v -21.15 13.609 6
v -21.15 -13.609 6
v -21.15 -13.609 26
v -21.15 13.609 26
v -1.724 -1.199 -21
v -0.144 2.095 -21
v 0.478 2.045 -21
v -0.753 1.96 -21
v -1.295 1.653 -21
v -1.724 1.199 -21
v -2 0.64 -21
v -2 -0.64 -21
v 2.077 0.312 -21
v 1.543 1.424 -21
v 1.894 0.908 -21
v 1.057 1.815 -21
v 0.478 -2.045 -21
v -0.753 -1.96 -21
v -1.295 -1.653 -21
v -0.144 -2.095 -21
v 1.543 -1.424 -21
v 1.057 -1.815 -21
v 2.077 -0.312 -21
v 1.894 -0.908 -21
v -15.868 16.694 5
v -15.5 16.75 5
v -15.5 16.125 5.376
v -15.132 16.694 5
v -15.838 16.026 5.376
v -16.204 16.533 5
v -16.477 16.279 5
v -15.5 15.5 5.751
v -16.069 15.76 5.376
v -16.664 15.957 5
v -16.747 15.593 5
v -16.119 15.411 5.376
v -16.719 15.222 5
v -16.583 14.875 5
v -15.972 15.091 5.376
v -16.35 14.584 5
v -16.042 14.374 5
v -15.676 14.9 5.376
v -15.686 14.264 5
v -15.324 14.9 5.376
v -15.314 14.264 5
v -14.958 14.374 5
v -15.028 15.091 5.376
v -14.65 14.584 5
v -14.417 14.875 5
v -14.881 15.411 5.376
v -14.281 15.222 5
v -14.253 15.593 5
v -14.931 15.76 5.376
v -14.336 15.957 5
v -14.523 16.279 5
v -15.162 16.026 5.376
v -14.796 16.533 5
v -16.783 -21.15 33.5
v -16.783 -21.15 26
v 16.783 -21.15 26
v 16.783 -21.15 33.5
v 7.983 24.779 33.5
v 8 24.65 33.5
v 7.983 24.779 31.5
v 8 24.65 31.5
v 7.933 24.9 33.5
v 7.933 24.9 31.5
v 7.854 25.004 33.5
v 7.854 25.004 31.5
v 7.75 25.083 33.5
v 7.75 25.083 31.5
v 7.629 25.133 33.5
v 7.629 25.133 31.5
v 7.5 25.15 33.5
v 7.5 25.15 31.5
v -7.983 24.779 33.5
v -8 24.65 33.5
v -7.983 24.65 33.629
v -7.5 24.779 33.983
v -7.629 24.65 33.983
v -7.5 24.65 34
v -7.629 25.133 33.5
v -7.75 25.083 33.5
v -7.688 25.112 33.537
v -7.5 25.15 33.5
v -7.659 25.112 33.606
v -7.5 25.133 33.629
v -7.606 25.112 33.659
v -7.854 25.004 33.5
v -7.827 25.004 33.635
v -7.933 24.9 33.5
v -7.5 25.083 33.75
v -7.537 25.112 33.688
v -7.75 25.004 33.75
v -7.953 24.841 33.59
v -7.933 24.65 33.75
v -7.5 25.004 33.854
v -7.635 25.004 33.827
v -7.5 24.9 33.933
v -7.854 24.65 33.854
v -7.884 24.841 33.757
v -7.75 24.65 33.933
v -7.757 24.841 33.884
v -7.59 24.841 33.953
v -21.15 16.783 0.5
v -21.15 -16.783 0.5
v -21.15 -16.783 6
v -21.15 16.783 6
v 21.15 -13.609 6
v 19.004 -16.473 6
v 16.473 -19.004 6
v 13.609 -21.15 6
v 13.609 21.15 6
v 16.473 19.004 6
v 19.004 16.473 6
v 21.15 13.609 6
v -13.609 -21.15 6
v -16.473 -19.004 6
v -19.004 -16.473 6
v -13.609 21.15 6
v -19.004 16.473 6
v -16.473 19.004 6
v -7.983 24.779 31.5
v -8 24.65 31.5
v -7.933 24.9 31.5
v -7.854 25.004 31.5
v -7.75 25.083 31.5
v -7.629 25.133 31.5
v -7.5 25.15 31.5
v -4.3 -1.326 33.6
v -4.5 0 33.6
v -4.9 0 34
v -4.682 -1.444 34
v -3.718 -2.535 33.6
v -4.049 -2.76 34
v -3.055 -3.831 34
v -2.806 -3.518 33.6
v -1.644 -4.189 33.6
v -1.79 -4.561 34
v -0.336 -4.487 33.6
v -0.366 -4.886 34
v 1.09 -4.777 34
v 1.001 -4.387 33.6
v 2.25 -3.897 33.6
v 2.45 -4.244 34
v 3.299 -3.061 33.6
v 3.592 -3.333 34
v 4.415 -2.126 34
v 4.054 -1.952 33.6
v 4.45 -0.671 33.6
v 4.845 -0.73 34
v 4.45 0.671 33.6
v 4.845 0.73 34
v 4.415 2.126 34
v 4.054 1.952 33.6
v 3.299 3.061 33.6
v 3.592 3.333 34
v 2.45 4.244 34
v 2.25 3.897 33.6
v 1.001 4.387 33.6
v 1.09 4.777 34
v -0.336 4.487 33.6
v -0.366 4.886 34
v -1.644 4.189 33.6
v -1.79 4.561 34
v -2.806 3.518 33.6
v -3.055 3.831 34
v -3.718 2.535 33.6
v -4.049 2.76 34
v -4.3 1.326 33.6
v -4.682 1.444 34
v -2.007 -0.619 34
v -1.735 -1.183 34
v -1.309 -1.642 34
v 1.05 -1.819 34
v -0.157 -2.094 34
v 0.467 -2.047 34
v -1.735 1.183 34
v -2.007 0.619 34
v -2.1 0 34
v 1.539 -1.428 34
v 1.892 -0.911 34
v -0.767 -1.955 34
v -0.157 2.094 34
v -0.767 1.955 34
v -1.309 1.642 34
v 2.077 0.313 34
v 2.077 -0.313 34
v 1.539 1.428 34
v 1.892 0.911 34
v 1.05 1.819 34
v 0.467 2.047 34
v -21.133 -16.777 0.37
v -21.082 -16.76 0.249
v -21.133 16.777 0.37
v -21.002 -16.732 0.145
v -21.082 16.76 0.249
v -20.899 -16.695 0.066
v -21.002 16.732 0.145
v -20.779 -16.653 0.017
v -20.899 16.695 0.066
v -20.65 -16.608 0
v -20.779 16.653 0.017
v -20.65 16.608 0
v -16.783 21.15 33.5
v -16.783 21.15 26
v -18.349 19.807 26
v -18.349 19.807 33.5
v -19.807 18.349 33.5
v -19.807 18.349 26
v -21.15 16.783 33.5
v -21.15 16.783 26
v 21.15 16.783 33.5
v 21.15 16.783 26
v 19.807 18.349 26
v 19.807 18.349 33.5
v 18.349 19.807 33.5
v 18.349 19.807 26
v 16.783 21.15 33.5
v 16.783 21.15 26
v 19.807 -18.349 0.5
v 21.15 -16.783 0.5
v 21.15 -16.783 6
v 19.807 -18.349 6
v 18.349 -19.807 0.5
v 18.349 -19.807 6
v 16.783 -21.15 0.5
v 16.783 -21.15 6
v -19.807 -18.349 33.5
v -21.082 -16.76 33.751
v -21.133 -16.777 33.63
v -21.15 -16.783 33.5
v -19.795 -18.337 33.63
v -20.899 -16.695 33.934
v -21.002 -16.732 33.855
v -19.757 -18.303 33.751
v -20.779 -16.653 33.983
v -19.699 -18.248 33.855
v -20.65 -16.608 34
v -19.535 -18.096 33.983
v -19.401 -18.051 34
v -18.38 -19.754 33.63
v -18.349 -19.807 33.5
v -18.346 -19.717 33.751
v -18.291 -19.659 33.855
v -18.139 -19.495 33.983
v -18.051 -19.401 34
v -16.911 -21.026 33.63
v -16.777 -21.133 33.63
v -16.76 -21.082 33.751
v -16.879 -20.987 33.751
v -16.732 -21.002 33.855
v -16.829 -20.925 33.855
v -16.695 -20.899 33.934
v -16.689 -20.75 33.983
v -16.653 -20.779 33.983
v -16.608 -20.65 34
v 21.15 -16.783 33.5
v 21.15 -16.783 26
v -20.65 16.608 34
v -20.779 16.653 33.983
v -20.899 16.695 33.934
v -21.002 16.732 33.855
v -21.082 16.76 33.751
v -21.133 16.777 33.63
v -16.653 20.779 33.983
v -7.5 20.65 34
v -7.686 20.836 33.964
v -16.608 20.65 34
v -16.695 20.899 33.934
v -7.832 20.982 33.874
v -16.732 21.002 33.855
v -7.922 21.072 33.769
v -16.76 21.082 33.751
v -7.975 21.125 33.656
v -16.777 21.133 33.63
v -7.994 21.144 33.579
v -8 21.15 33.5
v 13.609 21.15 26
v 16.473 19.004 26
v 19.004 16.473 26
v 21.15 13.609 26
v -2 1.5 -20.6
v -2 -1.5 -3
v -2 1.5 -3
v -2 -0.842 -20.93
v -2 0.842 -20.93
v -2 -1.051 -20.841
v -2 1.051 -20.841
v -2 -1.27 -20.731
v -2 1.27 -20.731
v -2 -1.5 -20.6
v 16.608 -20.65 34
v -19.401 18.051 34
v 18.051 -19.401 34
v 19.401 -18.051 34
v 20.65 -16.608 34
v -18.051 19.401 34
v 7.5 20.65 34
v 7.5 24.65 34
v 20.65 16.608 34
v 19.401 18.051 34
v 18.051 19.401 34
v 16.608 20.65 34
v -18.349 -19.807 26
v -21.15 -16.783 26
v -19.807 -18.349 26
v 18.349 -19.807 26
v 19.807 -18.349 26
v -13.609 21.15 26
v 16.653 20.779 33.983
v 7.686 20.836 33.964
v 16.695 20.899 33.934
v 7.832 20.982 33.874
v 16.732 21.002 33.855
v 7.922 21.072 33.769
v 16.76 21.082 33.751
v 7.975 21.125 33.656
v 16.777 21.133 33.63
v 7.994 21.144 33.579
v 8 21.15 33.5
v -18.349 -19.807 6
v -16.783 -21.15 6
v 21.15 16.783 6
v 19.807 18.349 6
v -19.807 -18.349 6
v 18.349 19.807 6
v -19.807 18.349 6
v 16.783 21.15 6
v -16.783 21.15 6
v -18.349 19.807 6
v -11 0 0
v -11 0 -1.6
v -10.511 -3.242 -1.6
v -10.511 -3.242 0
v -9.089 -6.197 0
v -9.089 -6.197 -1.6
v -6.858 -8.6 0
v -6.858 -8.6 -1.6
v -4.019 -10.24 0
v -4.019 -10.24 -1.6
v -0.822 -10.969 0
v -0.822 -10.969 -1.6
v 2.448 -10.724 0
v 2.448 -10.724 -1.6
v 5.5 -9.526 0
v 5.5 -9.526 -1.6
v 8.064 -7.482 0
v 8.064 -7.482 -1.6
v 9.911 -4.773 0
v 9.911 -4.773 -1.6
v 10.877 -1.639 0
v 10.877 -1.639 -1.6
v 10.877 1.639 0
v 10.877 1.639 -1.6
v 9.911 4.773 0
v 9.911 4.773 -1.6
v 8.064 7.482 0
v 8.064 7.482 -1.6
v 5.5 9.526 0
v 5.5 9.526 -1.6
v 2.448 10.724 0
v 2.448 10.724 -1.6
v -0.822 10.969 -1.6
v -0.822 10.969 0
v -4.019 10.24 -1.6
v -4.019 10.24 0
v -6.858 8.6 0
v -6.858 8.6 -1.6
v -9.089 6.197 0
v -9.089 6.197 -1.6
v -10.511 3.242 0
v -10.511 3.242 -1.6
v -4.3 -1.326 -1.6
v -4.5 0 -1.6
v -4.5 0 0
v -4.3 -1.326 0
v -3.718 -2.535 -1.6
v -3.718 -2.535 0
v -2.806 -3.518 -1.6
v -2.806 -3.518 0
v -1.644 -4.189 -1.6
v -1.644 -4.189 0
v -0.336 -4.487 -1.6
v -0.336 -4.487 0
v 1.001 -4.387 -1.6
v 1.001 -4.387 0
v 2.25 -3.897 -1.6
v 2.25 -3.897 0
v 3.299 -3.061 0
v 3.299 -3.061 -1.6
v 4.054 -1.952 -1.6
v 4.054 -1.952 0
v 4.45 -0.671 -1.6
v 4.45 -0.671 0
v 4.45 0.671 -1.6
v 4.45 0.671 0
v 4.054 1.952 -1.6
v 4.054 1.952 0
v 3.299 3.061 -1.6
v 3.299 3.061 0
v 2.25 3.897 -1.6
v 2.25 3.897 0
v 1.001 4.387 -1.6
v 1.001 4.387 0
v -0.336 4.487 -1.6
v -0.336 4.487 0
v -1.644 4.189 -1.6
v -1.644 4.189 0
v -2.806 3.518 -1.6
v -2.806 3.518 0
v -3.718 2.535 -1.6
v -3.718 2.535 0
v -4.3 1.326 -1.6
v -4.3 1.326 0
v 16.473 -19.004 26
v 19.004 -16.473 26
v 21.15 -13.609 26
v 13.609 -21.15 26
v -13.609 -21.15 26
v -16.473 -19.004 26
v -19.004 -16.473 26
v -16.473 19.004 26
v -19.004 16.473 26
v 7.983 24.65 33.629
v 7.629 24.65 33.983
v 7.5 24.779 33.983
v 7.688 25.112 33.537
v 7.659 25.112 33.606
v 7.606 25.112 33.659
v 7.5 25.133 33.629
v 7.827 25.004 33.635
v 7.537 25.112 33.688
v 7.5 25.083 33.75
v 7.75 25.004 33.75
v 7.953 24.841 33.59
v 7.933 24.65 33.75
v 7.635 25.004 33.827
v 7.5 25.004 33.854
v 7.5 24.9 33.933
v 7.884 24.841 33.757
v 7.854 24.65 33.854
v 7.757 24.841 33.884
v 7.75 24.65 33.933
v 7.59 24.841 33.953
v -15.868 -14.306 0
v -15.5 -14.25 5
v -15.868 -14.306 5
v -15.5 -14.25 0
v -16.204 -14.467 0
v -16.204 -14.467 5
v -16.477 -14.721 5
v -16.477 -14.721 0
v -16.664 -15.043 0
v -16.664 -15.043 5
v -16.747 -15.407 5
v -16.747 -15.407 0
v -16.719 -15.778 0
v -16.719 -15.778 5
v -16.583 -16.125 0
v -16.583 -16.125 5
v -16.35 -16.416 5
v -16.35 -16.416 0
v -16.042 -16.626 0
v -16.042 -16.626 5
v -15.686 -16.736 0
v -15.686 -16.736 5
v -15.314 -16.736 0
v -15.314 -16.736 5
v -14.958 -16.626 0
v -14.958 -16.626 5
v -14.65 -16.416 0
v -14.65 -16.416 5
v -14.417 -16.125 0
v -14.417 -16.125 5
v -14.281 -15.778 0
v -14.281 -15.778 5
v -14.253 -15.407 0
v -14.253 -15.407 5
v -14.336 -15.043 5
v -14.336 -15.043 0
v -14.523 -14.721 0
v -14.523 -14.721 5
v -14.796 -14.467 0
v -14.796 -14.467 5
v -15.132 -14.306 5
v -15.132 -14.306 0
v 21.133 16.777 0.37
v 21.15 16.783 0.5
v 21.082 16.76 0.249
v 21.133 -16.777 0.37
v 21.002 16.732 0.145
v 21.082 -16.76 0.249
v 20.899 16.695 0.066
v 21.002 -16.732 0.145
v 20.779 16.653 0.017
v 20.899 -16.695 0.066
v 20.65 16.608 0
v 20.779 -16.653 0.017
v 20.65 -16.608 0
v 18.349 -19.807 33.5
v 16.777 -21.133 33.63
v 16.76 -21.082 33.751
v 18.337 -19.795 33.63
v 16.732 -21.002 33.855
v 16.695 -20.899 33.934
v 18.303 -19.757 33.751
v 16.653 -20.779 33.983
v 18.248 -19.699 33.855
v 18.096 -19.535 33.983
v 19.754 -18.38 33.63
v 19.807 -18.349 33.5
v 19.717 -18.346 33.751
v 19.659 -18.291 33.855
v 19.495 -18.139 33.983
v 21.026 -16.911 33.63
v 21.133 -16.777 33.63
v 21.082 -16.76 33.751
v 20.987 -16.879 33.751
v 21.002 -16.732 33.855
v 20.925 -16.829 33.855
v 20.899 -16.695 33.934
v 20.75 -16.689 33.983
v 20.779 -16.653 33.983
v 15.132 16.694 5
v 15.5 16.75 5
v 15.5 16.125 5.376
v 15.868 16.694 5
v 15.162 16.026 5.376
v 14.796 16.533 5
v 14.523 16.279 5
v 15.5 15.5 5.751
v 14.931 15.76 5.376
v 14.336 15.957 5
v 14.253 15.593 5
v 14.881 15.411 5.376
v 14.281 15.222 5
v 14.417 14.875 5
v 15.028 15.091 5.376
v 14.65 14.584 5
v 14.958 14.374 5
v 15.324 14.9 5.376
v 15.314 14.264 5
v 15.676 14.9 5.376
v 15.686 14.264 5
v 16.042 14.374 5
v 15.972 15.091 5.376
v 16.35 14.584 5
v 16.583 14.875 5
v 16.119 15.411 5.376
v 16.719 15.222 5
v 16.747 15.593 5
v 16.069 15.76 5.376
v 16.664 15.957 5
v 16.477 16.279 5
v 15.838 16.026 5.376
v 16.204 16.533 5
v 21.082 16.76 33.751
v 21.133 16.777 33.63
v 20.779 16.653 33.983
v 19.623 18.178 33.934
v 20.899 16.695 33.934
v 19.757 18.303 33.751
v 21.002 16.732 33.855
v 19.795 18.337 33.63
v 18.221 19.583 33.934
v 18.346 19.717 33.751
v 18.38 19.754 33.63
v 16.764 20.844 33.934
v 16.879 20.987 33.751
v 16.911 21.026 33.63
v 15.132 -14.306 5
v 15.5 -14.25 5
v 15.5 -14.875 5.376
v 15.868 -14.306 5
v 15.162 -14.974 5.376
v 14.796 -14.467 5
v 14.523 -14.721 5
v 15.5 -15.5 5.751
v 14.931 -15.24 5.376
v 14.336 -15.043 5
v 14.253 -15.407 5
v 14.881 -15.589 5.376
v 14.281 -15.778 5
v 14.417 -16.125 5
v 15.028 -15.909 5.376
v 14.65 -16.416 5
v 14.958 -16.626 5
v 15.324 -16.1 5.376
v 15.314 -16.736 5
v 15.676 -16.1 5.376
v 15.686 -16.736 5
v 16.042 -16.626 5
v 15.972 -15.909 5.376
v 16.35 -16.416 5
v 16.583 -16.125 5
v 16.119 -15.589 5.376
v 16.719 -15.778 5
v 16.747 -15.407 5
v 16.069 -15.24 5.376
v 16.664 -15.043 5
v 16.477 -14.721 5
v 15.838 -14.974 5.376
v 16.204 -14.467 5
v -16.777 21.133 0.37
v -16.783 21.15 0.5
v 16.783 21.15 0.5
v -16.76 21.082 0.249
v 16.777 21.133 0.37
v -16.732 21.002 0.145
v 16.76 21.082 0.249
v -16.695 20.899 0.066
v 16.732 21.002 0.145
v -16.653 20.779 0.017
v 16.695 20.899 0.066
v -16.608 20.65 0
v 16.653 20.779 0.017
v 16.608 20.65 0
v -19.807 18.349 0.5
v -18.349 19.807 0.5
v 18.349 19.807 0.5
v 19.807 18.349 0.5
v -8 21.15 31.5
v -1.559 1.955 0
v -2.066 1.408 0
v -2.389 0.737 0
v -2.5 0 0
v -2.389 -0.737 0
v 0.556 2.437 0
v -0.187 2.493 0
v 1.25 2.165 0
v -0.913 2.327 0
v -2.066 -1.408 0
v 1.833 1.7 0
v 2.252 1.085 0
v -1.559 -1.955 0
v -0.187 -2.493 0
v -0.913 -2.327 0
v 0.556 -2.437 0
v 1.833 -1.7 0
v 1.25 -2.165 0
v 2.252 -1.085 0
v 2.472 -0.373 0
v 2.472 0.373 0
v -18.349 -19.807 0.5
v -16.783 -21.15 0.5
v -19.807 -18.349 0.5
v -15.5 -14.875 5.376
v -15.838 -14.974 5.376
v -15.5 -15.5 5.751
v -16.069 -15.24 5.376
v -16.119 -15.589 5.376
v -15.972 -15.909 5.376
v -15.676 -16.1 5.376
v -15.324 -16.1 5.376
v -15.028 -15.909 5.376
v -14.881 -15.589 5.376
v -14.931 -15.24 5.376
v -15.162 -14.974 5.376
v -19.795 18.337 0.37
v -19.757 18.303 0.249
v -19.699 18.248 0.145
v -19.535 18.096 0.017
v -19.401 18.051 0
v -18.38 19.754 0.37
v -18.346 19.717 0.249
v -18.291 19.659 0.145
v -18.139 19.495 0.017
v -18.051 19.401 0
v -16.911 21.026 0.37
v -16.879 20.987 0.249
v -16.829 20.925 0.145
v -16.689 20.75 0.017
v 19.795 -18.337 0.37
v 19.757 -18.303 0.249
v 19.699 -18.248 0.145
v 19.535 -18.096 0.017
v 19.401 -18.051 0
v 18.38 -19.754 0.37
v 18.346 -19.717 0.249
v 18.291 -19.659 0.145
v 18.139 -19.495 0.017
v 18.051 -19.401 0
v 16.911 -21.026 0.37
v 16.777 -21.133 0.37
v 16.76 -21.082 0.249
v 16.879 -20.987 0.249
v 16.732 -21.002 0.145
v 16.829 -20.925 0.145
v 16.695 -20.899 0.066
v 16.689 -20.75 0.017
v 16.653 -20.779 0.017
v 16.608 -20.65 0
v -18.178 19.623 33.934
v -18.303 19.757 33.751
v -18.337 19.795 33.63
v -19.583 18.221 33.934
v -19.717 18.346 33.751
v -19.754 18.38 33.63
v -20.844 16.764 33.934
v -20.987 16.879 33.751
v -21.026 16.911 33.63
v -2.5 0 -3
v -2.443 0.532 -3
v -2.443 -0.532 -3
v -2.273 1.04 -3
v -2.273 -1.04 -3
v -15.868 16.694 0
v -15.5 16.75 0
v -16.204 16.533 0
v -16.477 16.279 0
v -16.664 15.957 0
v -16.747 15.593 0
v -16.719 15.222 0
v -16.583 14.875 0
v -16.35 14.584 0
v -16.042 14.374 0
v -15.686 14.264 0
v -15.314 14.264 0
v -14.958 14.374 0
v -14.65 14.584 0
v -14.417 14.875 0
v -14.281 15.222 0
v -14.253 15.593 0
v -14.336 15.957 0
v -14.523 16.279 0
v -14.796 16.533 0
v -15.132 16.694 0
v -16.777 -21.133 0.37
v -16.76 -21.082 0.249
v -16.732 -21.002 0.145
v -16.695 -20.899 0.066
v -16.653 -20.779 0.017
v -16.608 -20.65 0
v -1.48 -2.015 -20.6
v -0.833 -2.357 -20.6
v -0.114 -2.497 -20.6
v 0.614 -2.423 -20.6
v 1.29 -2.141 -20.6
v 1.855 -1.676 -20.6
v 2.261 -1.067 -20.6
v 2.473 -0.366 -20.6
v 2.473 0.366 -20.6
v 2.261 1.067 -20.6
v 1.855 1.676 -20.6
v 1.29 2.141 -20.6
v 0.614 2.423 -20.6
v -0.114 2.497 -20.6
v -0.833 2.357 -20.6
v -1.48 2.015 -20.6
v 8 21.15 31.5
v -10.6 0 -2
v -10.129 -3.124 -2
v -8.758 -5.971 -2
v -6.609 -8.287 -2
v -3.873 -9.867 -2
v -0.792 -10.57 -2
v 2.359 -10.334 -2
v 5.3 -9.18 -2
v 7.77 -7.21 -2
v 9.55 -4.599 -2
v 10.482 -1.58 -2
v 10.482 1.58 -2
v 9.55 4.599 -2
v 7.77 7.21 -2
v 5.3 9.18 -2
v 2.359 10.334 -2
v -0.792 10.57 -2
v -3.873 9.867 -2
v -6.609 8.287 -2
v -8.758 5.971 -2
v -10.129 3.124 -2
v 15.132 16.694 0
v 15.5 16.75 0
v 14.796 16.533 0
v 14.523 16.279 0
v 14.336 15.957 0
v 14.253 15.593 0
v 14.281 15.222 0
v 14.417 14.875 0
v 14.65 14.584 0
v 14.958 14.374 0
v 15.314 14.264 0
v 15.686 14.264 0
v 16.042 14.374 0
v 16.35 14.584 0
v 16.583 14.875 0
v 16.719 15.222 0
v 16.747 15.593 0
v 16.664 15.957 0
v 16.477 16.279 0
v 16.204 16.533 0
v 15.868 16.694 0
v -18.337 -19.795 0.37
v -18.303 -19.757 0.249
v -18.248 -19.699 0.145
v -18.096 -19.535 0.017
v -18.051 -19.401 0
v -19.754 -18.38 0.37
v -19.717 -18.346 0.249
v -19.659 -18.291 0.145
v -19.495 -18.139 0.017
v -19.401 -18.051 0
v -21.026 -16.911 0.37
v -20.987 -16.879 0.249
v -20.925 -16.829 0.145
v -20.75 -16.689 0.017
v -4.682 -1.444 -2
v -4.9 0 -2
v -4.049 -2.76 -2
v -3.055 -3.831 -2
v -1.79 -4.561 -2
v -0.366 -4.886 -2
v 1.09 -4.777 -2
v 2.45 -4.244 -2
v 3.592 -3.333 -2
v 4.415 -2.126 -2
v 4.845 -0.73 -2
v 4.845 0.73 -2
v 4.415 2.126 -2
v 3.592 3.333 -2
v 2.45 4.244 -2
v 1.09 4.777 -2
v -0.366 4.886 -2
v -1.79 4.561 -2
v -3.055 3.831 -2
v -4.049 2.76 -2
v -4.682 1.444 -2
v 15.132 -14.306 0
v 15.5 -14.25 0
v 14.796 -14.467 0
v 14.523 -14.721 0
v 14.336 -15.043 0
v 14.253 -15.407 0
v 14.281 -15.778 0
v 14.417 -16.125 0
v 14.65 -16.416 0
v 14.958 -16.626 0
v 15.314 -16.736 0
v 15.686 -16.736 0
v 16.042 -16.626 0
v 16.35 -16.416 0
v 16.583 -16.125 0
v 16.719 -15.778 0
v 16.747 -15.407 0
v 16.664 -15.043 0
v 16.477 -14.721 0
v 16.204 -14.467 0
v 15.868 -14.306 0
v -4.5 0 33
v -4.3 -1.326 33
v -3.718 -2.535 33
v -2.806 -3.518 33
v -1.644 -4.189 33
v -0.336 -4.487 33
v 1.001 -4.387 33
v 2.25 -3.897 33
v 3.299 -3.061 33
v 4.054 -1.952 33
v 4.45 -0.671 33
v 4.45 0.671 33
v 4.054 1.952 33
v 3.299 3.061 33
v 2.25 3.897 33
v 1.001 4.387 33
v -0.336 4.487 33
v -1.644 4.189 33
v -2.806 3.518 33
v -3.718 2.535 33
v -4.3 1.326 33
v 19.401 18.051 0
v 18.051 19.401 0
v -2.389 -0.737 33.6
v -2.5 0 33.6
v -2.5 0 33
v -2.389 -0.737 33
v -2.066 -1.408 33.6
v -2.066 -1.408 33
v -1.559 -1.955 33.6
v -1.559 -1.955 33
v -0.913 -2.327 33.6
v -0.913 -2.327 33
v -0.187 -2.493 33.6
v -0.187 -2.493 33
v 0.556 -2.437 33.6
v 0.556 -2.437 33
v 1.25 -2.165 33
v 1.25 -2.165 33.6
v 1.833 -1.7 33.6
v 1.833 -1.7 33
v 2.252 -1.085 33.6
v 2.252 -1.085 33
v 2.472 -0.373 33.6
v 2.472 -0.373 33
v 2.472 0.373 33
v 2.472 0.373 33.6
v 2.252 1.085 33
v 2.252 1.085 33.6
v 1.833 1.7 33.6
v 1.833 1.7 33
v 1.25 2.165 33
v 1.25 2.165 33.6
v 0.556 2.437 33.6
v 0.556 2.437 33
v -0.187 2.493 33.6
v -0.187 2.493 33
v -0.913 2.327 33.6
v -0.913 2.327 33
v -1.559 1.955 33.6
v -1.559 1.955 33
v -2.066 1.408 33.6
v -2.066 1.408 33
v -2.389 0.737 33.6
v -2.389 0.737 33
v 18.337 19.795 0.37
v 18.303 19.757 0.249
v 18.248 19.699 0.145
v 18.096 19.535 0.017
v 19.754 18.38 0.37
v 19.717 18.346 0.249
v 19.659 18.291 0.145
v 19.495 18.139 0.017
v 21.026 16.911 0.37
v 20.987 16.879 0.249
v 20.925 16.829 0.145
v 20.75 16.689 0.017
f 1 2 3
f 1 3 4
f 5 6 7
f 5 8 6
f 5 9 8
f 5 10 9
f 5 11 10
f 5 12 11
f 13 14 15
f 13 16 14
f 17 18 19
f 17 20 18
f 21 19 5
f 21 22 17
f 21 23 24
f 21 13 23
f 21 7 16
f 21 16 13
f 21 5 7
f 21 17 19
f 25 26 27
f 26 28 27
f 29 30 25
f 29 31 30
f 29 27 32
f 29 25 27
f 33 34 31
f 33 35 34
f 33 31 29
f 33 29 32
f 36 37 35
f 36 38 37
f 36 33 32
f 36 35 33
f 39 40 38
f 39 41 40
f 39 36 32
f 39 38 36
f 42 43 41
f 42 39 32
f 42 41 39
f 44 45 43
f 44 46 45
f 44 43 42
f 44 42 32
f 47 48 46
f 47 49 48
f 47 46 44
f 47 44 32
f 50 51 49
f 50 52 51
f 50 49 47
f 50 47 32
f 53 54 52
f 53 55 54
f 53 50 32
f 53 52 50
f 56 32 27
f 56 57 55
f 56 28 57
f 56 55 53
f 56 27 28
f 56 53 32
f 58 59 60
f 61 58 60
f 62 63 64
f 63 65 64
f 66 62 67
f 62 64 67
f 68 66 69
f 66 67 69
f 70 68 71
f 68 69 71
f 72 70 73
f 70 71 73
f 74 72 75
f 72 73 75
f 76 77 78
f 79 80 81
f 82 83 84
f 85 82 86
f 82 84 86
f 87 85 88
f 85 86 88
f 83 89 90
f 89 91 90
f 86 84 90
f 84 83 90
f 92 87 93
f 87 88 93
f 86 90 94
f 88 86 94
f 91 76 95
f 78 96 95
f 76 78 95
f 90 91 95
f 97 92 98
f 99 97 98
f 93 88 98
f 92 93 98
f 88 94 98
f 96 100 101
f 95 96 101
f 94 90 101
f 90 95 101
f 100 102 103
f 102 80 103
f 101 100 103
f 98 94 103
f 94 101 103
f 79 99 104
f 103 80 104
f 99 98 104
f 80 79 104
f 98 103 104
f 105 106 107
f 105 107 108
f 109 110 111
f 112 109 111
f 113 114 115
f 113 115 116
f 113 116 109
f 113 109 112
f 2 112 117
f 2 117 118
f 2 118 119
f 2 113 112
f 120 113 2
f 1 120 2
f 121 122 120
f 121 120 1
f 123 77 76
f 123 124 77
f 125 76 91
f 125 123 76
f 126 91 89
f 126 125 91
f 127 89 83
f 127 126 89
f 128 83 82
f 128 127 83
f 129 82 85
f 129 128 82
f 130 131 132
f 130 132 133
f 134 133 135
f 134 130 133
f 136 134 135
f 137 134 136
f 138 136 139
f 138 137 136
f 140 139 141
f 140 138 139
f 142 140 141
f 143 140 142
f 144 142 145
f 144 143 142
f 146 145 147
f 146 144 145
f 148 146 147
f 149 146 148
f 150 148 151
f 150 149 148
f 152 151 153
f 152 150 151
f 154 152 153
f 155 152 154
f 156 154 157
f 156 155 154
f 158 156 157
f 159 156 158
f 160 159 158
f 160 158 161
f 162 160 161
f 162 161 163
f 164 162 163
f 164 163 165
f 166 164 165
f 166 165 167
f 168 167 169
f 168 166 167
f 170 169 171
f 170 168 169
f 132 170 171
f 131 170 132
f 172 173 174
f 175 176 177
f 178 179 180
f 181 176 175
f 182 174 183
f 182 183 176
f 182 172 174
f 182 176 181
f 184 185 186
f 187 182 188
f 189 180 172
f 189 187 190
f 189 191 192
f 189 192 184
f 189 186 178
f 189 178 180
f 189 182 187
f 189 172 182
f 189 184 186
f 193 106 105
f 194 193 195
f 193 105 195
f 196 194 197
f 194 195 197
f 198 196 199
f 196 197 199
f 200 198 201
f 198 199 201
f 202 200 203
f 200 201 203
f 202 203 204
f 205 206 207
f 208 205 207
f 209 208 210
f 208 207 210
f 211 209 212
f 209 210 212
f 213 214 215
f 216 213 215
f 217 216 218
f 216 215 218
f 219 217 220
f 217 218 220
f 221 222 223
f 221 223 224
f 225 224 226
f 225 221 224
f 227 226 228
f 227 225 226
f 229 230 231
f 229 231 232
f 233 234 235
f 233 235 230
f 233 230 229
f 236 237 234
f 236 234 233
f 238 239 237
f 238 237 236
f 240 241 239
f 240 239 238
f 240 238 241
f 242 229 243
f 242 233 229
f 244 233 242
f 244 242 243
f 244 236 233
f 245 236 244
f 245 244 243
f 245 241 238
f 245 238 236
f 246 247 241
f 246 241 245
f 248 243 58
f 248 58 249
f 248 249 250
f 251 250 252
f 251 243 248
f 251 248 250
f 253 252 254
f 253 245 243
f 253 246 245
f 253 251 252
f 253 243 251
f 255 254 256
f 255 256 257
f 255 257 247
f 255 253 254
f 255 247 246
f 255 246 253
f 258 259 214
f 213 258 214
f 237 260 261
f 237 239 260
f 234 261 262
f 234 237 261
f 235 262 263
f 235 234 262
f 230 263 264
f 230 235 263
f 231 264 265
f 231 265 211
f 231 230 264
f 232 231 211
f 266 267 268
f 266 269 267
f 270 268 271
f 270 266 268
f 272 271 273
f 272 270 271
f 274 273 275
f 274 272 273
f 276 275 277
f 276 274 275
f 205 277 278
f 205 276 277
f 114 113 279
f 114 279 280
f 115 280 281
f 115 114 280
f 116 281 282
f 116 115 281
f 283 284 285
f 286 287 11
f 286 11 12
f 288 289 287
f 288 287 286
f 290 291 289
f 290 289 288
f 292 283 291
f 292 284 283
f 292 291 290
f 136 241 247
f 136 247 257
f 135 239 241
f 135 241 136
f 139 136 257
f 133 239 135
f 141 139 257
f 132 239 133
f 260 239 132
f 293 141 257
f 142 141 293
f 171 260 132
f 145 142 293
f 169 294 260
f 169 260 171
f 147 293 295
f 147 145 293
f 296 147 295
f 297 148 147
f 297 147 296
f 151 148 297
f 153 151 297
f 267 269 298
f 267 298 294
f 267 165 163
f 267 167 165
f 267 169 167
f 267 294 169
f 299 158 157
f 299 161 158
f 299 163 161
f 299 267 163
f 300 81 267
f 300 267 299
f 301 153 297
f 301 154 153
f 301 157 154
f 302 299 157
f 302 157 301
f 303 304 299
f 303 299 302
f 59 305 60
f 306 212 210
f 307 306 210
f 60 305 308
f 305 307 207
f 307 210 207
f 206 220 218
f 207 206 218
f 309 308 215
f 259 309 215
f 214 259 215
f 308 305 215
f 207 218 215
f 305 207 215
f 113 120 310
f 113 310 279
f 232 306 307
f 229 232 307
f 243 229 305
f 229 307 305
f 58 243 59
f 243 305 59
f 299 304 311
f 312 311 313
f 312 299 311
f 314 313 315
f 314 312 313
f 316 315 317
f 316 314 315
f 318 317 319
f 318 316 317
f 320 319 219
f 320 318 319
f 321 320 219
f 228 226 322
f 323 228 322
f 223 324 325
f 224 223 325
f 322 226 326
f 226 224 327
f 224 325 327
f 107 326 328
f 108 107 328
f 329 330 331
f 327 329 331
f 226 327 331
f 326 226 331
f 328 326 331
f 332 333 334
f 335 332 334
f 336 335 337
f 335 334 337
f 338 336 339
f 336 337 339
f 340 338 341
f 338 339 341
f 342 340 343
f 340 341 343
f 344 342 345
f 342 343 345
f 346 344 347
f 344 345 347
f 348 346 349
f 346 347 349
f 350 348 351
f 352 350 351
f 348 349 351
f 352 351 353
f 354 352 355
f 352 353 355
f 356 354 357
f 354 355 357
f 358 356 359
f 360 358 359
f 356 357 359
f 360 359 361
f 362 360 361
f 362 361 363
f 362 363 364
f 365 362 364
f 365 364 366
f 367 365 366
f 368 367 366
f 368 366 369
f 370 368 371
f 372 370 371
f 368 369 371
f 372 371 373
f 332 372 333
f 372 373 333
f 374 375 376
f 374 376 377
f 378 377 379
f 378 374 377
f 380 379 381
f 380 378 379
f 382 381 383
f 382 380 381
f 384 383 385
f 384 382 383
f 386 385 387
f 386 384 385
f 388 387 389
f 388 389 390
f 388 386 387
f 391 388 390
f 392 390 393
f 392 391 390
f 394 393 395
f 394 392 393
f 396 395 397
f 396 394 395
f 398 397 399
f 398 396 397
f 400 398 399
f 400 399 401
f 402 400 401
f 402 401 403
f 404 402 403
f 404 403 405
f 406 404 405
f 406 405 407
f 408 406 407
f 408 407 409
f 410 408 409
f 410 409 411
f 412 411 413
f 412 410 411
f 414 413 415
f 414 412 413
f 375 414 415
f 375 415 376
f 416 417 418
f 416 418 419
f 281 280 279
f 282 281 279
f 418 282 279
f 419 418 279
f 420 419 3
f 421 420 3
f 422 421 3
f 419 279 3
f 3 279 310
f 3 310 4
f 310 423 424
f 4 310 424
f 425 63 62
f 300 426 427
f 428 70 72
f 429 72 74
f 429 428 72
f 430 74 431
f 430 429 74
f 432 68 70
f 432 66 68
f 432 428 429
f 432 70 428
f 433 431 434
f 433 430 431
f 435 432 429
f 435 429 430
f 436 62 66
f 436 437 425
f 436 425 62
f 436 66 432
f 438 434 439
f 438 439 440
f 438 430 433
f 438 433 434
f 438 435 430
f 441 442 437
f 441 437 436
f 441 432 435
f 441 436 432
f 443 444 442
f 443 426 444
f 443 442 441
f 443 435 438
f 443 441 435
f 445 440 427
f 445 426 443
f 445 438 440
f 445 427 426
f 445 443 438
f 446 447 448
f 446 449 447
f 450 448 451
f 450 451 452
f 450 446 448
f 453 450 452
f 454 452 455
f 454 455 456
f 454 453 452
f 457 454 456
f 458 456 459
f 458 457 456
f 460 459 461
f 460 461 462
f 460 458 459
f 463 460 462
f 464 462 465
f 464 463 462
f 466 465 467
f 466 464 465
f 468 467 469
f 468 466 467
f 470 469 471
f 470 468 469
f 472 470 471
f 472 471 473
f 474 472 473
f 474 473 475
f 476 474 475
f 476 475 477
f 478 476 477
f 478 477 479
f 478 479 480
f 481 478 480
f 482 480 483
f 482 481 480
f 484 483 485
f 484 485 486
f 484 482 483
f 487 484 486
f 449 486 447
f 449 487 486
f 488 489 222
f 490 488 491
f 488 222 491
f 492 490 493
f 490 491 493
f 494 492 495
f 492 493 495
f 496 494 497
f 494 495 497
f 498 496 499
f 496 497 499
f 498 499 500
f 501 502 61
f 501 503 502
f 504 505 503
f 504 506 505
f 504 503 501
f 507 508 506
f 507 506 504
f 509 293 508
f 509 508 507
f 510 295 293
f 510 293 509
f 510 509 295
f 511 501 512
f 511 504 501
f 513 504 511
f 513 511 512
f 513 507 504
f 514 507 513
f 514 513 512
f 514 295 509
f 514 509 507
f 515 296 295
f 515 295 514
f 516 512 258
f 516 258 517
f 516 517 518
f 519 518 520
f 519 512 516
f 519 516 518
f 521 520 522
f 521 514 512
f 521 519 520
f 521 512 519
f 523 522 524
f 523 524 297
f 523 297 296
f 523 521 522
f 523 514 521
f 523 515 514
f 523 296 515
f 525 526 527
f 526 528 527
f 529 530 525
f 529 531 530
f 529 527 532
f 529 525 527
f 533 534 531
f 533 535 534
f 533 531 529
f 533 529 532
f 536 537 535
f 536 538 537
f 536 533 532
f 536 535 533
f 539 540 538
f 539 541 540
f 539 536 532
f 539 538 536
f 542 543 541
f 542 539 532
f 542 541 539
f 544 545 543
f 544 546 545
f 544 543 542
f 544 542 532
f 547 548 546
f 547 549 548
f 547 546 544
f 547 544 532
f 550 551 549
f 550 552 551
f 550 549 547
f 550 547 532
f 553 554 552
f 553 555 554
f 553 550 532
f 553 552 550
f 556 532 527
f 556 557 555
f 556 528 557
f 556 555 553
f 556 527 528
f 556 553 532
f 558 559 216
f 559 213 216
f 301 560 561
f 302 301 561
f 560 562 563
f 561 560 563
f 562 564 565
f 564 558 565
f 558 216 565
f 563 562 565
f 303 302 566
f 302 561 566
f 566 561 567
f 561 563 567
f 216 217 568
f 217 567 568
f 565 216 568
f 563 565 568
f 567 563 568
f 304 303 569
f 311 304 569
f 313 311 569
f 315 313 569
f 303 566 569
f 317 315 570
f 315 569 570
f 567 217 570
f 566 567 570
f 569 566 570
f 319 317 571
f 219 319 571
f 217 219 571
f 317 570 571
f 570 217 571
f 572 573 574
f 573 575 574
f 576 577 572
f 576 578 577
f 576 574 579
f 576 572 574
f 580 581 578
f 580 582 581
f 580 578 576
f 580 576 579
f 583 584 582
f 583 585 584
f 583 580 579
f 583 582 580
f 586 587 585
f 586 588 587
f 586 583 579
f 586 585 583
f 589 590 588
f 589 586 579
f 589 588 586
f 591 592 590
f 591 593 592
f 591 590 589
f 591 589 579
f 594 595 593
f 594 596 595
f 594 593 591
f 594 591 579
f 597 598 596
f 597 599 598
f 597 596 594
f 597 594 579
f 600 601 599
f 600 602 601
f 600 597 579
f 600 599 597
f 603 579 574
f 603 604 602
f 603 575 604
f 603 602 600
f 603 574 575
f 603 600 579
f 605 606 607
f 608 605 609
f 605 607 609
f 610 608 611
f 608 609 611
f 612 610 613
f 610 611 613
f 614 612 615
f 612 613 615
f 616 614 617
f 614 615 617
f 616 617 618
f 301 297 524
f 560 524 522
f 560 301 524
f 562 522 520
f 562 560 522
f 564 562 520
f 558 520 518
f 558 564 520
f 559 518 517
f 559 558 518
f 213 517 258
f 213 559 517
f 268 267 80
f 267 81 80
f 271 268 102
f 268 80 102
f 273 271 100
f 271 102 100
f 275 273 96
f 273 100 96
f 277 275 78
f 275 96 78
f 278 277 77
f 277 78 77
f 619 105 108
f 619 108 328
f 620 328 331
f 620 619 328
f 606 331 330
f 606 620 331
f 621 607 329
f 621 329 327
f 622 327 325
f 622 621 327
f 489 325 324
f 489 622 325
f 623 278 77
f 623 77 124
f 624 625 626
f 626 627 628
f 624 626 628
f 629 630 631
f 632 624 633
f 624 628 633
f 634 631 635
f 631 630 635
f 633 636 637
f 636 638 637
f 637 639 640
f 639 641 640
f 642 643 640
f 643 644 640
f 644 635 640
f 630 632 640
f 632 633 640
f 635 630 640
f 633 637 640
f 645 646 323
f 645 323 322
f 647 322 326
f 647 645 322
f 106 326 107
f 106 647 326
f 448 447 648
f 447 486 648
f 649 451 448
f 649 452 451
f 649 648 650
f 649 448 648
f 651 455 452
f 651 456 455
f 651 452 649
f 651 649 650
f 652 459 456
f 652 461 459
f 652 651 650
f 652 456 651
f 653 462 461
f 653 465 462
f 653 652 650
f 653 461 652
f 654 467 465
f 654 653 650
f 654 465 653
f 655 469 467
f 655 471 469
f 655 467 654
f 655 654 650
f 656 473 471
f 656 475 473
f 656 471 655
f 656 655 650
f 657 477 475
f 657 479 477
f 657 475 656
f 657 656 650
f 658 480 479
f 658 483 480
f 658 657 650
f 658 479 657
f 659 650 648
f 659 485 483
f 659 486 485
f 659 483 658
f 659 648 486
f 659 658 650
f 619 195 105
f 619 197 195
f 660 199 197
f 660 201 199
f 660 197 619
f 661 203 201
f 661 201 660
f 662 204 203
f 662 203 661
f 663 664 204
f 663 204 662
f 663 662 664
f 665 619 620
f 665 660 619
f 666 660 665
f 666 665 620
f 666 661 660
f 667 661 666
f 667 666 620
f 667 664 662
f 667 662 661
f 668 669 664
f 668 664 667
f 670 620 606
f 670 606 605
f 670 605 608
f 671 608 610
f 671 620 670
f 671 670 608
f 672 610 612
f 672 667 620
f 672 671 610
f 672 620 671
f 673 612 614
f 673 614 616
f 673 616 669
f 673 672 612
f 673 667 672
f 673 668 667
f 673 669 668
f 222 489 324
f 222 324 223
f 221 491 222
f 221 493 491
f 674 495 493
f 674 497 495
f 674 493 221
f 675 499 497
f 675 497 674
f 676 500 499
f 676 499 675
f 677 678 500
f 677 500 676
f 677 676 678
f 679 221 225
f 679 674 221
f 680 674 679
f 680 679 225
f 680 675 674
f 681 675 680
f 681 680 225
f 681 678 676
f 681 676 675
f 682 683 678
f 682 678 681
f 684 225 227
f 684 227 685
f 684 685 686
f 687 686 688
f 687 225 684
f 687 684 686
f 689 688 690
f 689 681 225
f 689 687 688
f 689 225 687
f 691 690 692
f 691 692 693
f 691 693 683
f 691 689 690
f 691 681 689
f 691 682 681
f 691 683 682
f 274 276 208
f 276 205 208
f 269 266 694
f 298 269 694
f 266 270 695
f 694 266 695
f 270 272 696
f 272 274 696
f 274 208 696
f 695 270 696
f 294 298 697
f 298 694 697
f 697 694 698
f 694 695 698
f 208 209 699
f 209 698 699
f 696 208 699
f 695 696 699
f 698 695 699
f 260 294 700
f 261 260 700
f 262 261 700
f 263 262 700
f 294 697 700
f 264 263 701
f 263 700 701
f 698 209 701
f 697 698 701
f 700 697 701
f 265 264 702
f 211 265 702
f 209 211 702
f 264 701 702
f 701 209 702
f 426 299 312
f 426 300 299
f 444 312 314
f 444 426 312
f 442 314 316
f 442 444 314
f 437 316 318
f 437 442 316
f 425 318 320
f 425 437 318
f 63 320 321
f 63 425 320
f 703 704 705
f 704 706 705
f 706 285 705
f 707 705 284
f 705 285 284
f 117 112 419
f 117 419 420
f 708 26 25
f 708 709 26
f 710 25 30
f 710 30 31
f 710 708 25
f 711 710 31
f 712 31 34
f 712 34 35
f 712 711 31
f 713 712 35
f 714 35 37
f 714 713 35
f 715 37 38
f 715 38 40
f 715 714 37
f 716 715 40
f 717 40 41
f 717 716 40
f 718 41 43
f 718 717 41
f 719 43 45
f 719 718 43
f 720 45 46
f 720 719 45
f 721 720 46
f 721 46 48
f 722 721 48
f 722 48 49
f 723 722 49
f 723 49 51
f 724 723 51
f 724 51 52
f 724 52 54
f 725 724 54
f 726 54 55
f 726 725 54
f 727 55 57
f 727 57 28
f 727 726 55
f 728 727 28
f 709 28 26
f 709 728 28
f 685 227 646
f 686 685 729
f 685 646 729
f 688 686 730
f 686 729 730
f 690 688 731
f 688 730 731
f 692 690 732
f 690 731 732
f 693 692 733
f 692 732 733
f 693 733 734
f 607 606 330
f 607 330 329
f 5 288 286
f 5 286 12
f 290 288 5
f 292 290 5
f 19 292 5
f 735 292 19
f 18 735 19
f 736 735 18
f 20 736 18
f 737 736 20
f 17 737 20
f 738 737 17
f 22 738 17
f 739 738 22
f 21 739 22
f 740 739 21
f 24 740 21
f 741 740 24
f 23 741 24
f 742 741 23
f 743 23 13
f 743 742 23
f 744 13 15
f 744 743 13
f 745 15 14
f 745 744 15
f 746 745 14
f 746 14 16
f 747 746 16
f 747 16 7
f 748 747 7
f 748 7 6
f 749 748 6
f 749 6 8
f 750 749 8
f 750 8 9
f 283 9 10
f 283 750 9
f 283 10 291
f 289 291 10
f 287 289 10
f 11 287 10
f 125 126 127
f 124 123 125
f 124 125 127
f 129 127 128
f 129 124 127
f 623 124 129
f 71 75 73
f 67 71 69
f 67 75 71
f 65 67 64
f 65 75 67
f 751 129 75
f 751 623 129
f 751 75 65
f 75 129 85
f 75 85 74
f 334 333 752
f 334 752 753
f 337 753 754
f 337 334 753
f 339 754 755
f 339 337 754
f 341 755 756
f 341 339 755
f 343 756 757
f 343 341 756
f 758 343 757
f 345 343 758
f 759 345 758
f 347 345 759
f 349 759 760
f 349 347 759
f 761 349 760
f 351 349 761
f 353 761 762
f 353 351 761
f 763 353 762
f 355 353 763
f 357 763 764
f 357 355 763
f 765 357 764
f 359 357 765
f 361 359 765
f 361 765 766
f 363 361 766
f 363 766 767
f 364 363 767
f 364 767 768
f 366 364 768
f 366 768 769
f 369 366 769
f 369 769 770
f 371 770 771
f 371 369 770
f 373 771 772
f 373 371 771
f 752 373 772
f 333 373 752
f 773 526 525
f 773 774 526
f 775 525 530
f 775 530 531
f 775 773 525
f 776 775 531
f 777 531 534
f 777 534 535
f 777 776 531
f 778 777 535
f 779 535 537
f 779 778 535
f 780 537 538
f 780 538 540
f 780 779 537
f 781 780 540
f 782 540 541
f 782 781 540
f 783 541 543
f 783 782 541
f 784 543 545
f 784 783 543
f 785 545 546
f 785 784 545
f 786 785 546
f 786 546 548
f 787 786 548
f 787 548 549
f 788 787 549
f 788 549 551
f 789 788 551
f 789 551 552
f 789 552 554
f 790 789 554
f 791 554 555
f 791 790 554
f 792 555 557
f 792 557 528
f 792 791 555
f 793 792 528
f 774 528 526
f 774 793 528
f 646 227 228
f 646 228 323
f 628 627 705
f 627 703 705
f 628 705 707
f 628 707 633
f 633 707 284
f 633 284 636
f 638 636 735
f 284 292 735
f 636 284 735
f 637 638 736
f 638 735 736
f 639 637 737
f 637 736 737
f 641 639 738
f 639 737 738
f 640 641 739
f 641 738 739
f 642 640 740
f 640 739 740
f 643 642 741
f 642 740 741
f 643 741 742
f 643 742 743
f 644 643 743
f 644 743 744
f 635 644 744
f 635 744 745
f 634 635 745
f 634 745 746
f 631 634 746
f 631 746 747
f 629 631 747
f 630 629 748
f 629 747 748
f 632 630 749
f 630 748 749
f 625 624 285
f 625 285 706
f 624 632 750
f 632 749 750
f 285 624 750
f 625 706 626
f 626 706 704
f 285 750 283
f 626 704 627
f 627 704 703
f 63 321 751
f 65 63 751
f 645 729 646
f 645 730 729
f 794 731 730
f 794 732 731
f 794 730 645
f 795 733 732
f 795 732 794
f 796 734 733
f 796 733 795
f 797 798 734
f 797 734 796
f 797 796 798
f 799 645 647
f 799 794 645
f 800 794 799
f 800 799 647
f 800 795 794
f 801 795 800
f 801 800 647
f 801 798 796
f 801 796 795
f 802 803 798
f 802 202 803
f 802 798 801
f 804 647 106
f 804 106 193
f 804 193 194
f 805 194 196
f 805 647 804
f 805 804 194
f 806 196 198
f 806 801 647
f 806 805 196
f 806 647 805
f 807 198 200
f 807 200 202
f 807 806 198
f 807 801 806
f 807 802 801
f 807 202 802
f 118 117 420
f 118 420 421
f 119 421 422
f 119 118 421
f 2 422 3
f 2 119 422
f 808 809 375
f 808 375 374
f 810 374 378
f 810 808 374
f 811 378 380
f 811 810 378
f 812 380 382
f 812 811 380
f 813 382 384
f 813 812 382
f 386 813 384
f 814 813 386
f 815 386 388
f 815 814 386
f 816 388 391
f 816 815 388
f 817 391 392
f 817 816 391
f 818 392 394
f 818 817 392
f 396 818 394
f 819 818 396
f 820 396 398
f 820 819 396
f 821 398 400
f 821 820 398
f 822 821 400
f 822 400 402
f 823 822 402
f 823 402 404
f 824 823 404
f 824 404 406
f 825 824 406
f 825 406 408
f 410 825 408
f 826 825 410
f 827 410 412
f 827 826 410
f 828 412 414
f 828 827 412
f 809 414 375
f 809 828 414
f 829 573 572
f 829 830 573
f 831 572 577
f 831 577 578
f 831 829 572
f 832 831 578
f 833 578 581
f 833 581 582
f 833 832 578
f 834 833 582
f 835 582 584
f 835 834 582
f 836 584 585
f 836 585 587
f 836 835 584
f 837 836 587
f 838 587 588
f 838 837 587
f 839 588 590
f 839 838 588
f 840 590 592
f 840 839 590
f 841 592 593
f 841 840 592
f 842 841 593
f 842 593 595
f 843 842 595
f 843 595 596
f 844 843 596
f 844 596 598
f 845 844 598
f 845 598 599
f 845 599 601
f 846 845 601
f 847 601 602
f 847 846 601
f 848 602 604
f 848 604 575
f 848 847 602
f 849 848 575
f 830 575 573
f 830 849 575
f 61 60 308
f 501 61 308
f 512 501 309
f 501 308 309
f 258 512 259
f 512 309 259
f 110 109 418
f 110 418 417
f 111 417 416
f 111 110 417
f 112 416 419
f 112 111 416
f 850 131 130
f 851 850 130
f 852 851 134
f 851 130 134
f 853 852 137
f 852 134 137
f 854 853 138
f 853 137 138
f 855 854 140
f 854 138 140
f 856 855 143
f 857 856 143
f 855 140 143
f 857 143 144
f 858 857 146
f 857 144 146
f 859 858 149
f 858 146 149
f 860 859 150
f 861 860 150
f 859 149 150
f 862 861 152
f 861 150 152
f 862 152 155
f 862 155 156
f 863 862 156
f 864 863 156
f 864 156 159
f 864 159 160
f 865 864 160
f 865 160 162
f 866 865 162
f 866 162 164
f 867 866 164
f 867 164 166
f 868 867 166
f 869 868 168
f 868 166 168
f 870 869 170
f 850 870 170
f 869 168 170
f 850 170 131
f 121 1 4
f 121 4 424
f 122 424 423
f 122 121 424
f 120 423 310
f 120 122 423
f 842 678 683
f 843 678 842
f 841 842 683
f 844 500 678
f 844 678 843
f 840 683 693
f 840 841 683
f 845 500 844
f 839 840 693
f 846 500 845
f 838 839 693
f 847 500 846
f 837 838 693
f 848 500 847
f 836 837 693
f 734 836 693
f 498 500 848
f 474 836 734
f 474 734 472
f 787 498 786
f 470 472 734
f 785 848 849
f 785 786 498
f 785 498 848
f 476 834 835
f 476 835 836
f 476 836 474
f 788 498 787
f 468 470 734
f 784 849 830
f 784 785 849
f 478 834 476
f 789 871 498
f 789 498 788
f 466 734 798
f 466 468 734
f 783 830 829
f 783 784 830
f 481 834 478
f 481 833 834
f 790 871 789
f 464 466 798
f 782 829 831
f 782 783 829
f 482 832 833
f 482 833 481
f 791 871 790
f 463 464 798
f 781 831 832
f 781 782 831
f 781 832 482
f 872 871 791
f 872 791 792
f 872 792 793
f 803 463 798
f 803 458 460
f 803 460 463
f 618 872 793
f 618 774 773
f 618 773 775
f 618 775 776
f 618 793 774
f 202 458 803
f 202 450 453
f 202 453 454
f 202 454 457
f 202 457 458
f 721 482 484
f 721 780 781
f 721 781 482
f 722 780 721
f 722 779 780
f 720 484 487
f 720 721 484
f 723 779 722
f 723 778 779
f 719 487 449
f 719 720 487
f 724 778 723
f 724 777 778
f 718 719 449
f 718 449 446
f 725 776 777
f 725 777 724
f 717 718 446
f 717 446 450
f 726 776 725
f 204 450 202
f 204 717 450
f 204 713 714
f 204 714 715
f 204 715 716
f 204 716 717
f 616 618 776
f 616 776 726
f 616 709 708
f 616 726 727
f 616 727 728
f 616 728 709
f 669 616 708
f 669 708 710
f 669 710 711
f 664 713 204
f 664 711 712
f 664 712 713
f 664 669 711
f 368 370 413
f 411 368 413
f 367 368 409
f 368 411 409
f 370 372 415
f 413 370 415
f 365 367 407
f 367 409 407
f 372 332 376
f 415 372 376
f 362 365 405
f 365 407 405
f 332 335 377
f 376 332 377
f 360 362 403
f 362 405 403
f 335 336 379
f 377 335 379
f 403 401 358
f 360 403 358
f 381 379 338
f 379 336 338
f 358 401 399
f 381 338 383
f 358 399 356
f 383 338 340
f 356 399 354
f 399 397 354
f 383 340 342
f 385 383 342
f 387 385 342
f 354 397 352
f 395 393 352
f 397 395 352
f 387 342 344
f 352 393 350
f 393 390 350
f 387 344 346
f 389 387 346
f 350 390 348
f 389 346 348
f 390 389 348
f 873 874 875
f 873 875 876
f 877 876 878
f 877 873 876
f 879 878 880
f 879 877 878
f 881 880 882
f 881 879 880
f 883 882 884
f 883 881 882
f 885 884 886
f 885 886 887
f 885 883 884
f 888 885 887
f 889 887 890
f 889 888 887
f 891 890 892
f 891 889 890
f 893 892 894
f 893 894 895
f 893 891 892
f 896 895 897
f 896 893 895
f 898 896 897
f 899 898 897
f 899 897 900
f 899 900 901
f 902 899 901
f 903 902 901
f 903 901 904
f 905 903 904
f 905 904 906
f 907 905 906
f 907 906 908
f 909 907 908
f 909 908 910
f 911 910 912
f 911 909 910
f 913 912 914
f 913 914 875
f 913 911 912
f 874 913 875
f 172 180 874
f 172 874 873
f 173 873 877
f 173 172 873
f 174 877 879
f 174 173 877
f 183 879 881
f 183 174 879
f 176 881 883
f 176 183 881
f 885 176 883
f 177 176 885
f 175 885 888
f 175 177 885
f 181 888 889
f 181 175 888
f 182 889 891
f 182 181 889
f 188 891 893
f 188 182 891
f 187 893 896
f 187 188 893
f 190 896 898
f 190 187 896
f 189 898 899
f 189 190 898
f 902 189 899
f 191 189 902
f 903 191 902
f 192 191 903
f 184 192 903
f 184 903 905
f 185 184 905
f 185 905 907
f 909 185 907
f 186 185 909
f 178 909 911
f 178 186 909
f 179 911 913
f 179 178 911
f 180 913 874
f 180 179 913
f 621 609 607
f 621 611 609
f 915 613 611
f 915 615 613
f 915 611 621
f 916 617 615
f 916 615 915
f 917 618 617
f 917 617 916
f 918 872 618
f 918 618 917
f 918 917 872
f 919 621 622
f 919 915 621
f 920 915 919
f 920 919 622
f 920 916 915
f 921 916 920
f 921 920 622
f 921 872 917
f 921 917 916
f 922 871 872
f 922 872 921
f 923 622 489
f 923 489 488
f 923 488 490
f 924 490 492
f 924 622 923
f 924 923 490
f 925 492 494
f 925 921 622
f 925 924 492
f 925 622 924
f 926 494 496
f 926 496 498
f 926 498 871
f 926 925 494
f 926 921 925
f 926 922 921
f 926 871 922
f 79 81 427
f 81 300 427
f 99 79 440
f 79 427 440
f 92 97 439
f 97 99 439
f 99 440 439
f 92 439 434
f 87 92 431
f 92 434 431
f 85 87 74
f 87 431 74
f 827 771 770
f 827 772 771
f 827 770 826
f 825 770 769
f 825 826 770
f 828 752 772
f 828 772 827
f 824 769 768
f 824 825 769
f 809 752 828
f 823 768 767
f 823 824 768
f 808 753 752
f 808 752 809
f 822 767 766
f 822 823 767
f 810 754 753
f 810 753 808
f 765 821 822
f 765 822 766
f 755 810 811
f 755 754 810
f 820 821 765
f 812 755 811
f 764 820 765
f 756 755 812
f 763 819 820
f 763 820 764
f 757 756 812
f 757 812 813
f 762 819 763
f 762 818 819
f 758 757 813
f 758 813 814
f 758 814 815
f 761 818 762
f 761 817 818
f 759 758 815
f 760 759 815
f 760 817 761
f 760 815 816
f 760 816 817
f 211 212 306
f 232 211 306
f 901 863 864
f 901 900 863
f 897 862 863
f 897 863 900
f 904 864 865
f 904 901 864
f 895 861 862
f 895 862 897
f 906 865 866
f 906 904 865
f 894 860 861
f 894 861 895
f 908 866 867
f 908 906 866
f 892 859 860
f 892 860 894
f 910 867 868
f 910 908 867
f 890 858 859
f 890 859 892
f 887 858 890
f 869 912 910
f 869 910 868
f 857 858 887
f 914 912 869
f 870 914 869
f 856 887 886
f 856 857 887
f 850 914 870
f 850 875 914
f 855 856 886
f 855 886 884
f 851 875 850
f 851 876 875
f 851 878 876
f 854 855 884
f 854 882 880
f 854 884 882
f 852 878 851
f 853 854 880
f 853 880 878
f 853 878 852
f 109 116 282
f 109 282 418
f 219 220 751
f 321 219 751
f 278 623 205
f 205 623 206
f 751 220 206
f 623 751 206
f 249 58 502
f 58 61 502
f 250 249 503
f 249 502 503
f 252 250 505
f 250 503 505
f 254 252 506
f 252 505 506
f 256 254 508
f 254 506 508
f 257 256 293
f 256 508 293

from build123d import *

# Parameters (mm, degrees)
BOSS_EXTRU_1_DEPTH           = 6
BOSS_EXTRU_2_DEPTH           = 20
BOSS_EXTRU_3_DEPTH           = 8
ESQUISSE4_W                  = 16
ESQUISSE4_H                  = 2.5
BOSS_EXTRU_4_DEPTH           = 4
ESQUISSE5_W                  = 2
ESQUISSE5_H                  = 6.5
ESQUISSE5_W_2                = 21
ESQUISSE5_H_2                = 2.5
CONG_1_R                     = 0.5
CONG_2_R                     = 0.5
CHANFREIN1_SIZE              = 0.4
CHANFREIN2_SIZE              = 0.4
ENL_V_MAT_EXTRU_1_DEPTH      = 48.284722808
ENL_V_MAT_EXTRU_1_DEPTH_BACK = 48.284722808
ESQUISSE6_W                  = 18
ESQUISSE6_H                  = 0.5
ESQUISSE7_R                  = 4.5
ESQUISSE7_R_2                = 2.5
ENL_V_MAT_EXTRU_2_DEPTH      = 1
CHANFREIN3_SIZE              = 0.4
TROU_TARAUD_M31_AT_2_COUNT   = 2
TROU_TARAUD_M31_AT_2_PITCH   = 31
TROU_TARAUD_M31_AT_3_COUNT   = 2
TROU_TARAUD_M31_AT_3_PITCH   = 43.840620434
TROU_TARAUD_M31_AT_4_COUNT   = 2
TROU_TARAUD_M31_AT_4_PITCH   = 31


with BuildPart() as part:
    # Esquisse1 → Boss.-Extru.1 (new body)
    with BuildSketch(Plane.XY):
        with BuildLine():
            Line((21.15, 16.783250579), (21.15, -16.783250579))
            ThreePointArc((21.15, -16.783250579), (19.091883092, -19.091883092), (16.783250579, -21.15))
            Line((16.783250579, -21.15), (-16.783250579, -21.15))
            ThreePointArc((-16.783250579, -21.15), (-19.091883092, -19.091883092), (-21.15, -16.783250579))
            Line((-21.15, -16.783250579), (-21.15, 16.783250579))
            ThreePointArc((-21.15, 16.783250579), (-19.091883092, 19.091883092), (-16.783250579, 21.15))
            Line((-16.783250579, 21.15), (16.783250579, 21.15))
            ThreePointArc((16.783250579, 21.15), (19.091883092, 19.091883092), (21.15, 16.783250579))
        make_face()
    extrude(amount=BOSS_EXTRU_1_DEPTH)

    # Congé2
    cong_2_edges = [part.edges().sort_by_distance(p)[0] for p in [
        (0, 21.15, 0),
        (19.091883092, 19.091883092, 0),
        (21.15, 0, 0),
        (19.091883092, -19.091883092, 0),
        (0, -21.15, 0),
        (-19.091883092, -19.091883092, 0),
        (-21.15, 0, 0),
        (-19.091883092, 19.091883092, 0),
    ]]
    fillet(cong_2_edges, radius=CONG_2_R)

    # Esquisse9 → Trou taraudé M31 (revolve, cut)
    with BuildSketch(Plane(origin=(15.5, -15.5, 0), x_dir=(0, 1, 0), z_dir=(1, 0, 0))):
        Polygon((0, 0), (0, 5.751075774), (1.25, 5), (1.25, 0), align=None)
    trou_taraud_m31 = revolve(axis=Axis((15.5, -15.5, -6.35), (0, 0, 1)), mode=Mode.SUBTRACT)

    # Trou taraudé M31 at 2: Trou taraudé M31 ×2
    with Locations(*[(0, i * TROU_TARAUD_M31_AT_2_PITCH, 0) for i in range(1, TROU_TARAUD_M31_AT_2_COUNT)]):
        add(trou_taraud_m31, mode=Mode.SUBTRACT)

    # Trou taraudé M31 at 3: Trou taraudé M31 ×2
    with Locations(*[Vector(-0.7071067811865476, 0.7071067811865476, 0) * (i * TROU_TARAUD_M31_AT_3_PITCH) for i in range(1, TROU_TARAUD_M31_AT_3_COUNT)]):
        add(trou_taraud_m31, mode=Mode.SUBTRACT)

    # Trou taraudé M31 at 4: Trou taraudé M31 ×2
    with Locations(*[(-i * TROU_TARAUD_M31_AT_4_PITCH, 0, 0) for i in range(1, TROU_TARAUD_M31_AT_4_COUNT)]):
        add(trou_taraud_m31, mode=Mode.SUBTRACT)


with BuildPart() as body_2:
    # Esquisse2 → Boss.-Extru.2 (new body)
    with BuildSketch(Plane.XY.offset(6)):
        with BuildLine():
            Line((-13.608820669, 21.15), (13.608820669, 21.15))
            ThreePointArc((13.608820669, 21.15), (17.783735547, 17.783735547), (21.15, 13.608820669))
            Line((21.15, 13.608820669), (21.15, -13.608820669))
            ThreePointArc((21.15, -13.608820669), (17.783735547, -17.783735547), (13.608820669, -21.15))
            Line((13.608820669, -21.15), (-13.608820669, -21.15))
            ThreePointArc((-13.608820669, -21.15), (-17.783735547, -17.783735547), (-21.15, -13.608820669))
            Line((-21.15, -13.608820669), (-21.15, 13.608820669))
            ThreePointArc((-21.15, 13.608820669), (-17.783735547, 17.783735547), (-13.608820669, 21.15))
        make_face()
    extrude(amount=BOSS_EXTRU_2_DEPTH)


with BuildPart() as body_3:
    # Esquisse3 → Boss.-Extru.3 (new body)
    with BuildSketch(Plane.XY.offset(26)):
        with BuildLine():
            Line((-16.783250579, -21.15), (16.783250579, -21.15))
            ThreePointArc((16.783250579, -21.15), (19.091883092, -19.091883092), (21.15, -16.783250579))
            Line((21.15, -16.783250579), (21.15, 16.783250579))
            ThreePointArc((21.15, 16.783250579), (19.091883092, 19.091883092), (16.783250579, 21.15))
            Line((16.783250579, 21.15), (-16.783250579, 21.15))
            ThreePointArc((-16.783250579, 21.15), (-19.091883092, 19.091883092), (-21.15, 16.783250579))
            Line((-21.15, 16.783250579), (-21.15, -16.783250579))
            ThreePointArc((-21.15, -16.783250579), (-19.091883092, -19.091883092), (-16.783250579, -21.15))
        make_face()
    extrude(amount=BOSS_EXTRU_3_DEPTH)

    # Esquisse4 → Boss.-Extru.4 (add)
    with BuildSketch(Plane(origin=(0, 21.15, 0), x_dir=(1, 0, 0), z_dir=(0, 1, 0))):
        with Locations((0, -32.75)):
            Rectangle(ESQUISSE4_W, ESQUISSE4_H)
    extrude(amount=BOSS_EXTRU_4_DEPTH)

    # Congé1
    cong_1_edges = [body_3.edges().sort_by_distance(p)[0] for p in [
        (19.091883092, -19.091883092, 34),
        (21.15, 0, 34),
        (19.091883092, 19.091883092, 34),
        (12.39162529, 21.15, 34),
        (-19.091883092, 19.091883092, 34),
        (-21.15, 0, 34),
        (-12.39162529, 21.15, 34),
        (8, 23.15, 34),
        (-8, 23.15, 34),
        (8, 25.15, 32.75),
        (-8, 25.15, 32.75),
        (0, 25.15, 34),
        (-19.091883092, -19.091883092, 34),
        (0, -21.15, 34),
    ]]
    fillet(cong_1_edges, radius=CONG_1_R)

    # Esquisse7 → Enlèv. mat.-Extru.2 (cut)
    with BuildSketch(Plane.XY.offset(34)):
        with Locations(Location((0, 0, 0), (0, 0, 180))):
            Circle(ESQUISSE7_R)
        with Locations(Location((0, 0, 0), (0, 0, 180))):
            Circle(ESQUISSE7_R_2, mode=Mode.SUBTRACT)
    extrude(amount=-ENL_V_MAT_EXTRU_2_DEPTH, mode=Mode.SUBTRACT)

    # Chanfrein3
    chanfrein3_edges = [body_3.edges().sort_by_distance(p)[0] for p in [
        (4.5, 0, 34),
        (2.5, 0, 34),
    ]]
    chamfer(chanfrein3_edges, length=CHANFREIN3_SIZE)


with BuildPart() as body_4:
    # Esquisse5 → Révolution1 (revolve)
    with BuildSketch(Plane(origin=(0, 0, 0), x_dir=(0, 0, -1), z_dir=(1, 0, 0)), mode=Mode.PRIVATE) as r_volution1_sk:
        with Locations((1, 7.75)):
            Rectangle(ESQUISSE5_W, ESQUISSE5_H)
        with Locations((10.5, 1.25)):
            Rectangle(ESQUISSE5_W_2, ESQUISSE5_H_2)
    revolve(r_volution1_sk.sketch.rotate(Axis((0, 0, 0), (0, 0, 1)), 90), axis=Axis((0, 0, 0), (0, 0, 1)))

    # Chanfrein1
    chanfrein1_edges = [body_4.edges().sort_by_distance(p)[0] for p in [
        (2.5, 0, -21),
    ]]
    chamfer(chanfrein1_edges, length=CHANFREIN1_SIZE)

    # Chanfrein2
    chanfrein2_edges = [body_4.edges().sort_by_distance(p)[0] for p in [
        (11, 0, -2),
        (4.5, 0, -2),
    ]]
    chamfer(chanfrein2_edges, length=CHANFREIN2_SIZE)

    # Esquisse6 → Enlèv. mat.-Extru.1 (cut, two sides: drawn at the far end of the back side and taken through both)
    with BuildSketch(Plane(origin=(0, 0, 0), x_dir=(0, 0, -1), z_dir=(0, 1, 0)).offset(-ENL_V_MAT_EXTRU_1_DEPTH_BACK)):
        with Locations((12, 2.25)):
            Rectangle(ESQUISSE6_W, ESQUISSE6_H)
    extrude(amount=ENL_V_MAT_EXTRU_1_DEPTH + ENL_V_MAT_EXTRU_1_DEPTH_BACK, mode=Mode.SUBTRACT)


solid = Compound([part.part, body_2.part, body_3.part, body_4.part])
